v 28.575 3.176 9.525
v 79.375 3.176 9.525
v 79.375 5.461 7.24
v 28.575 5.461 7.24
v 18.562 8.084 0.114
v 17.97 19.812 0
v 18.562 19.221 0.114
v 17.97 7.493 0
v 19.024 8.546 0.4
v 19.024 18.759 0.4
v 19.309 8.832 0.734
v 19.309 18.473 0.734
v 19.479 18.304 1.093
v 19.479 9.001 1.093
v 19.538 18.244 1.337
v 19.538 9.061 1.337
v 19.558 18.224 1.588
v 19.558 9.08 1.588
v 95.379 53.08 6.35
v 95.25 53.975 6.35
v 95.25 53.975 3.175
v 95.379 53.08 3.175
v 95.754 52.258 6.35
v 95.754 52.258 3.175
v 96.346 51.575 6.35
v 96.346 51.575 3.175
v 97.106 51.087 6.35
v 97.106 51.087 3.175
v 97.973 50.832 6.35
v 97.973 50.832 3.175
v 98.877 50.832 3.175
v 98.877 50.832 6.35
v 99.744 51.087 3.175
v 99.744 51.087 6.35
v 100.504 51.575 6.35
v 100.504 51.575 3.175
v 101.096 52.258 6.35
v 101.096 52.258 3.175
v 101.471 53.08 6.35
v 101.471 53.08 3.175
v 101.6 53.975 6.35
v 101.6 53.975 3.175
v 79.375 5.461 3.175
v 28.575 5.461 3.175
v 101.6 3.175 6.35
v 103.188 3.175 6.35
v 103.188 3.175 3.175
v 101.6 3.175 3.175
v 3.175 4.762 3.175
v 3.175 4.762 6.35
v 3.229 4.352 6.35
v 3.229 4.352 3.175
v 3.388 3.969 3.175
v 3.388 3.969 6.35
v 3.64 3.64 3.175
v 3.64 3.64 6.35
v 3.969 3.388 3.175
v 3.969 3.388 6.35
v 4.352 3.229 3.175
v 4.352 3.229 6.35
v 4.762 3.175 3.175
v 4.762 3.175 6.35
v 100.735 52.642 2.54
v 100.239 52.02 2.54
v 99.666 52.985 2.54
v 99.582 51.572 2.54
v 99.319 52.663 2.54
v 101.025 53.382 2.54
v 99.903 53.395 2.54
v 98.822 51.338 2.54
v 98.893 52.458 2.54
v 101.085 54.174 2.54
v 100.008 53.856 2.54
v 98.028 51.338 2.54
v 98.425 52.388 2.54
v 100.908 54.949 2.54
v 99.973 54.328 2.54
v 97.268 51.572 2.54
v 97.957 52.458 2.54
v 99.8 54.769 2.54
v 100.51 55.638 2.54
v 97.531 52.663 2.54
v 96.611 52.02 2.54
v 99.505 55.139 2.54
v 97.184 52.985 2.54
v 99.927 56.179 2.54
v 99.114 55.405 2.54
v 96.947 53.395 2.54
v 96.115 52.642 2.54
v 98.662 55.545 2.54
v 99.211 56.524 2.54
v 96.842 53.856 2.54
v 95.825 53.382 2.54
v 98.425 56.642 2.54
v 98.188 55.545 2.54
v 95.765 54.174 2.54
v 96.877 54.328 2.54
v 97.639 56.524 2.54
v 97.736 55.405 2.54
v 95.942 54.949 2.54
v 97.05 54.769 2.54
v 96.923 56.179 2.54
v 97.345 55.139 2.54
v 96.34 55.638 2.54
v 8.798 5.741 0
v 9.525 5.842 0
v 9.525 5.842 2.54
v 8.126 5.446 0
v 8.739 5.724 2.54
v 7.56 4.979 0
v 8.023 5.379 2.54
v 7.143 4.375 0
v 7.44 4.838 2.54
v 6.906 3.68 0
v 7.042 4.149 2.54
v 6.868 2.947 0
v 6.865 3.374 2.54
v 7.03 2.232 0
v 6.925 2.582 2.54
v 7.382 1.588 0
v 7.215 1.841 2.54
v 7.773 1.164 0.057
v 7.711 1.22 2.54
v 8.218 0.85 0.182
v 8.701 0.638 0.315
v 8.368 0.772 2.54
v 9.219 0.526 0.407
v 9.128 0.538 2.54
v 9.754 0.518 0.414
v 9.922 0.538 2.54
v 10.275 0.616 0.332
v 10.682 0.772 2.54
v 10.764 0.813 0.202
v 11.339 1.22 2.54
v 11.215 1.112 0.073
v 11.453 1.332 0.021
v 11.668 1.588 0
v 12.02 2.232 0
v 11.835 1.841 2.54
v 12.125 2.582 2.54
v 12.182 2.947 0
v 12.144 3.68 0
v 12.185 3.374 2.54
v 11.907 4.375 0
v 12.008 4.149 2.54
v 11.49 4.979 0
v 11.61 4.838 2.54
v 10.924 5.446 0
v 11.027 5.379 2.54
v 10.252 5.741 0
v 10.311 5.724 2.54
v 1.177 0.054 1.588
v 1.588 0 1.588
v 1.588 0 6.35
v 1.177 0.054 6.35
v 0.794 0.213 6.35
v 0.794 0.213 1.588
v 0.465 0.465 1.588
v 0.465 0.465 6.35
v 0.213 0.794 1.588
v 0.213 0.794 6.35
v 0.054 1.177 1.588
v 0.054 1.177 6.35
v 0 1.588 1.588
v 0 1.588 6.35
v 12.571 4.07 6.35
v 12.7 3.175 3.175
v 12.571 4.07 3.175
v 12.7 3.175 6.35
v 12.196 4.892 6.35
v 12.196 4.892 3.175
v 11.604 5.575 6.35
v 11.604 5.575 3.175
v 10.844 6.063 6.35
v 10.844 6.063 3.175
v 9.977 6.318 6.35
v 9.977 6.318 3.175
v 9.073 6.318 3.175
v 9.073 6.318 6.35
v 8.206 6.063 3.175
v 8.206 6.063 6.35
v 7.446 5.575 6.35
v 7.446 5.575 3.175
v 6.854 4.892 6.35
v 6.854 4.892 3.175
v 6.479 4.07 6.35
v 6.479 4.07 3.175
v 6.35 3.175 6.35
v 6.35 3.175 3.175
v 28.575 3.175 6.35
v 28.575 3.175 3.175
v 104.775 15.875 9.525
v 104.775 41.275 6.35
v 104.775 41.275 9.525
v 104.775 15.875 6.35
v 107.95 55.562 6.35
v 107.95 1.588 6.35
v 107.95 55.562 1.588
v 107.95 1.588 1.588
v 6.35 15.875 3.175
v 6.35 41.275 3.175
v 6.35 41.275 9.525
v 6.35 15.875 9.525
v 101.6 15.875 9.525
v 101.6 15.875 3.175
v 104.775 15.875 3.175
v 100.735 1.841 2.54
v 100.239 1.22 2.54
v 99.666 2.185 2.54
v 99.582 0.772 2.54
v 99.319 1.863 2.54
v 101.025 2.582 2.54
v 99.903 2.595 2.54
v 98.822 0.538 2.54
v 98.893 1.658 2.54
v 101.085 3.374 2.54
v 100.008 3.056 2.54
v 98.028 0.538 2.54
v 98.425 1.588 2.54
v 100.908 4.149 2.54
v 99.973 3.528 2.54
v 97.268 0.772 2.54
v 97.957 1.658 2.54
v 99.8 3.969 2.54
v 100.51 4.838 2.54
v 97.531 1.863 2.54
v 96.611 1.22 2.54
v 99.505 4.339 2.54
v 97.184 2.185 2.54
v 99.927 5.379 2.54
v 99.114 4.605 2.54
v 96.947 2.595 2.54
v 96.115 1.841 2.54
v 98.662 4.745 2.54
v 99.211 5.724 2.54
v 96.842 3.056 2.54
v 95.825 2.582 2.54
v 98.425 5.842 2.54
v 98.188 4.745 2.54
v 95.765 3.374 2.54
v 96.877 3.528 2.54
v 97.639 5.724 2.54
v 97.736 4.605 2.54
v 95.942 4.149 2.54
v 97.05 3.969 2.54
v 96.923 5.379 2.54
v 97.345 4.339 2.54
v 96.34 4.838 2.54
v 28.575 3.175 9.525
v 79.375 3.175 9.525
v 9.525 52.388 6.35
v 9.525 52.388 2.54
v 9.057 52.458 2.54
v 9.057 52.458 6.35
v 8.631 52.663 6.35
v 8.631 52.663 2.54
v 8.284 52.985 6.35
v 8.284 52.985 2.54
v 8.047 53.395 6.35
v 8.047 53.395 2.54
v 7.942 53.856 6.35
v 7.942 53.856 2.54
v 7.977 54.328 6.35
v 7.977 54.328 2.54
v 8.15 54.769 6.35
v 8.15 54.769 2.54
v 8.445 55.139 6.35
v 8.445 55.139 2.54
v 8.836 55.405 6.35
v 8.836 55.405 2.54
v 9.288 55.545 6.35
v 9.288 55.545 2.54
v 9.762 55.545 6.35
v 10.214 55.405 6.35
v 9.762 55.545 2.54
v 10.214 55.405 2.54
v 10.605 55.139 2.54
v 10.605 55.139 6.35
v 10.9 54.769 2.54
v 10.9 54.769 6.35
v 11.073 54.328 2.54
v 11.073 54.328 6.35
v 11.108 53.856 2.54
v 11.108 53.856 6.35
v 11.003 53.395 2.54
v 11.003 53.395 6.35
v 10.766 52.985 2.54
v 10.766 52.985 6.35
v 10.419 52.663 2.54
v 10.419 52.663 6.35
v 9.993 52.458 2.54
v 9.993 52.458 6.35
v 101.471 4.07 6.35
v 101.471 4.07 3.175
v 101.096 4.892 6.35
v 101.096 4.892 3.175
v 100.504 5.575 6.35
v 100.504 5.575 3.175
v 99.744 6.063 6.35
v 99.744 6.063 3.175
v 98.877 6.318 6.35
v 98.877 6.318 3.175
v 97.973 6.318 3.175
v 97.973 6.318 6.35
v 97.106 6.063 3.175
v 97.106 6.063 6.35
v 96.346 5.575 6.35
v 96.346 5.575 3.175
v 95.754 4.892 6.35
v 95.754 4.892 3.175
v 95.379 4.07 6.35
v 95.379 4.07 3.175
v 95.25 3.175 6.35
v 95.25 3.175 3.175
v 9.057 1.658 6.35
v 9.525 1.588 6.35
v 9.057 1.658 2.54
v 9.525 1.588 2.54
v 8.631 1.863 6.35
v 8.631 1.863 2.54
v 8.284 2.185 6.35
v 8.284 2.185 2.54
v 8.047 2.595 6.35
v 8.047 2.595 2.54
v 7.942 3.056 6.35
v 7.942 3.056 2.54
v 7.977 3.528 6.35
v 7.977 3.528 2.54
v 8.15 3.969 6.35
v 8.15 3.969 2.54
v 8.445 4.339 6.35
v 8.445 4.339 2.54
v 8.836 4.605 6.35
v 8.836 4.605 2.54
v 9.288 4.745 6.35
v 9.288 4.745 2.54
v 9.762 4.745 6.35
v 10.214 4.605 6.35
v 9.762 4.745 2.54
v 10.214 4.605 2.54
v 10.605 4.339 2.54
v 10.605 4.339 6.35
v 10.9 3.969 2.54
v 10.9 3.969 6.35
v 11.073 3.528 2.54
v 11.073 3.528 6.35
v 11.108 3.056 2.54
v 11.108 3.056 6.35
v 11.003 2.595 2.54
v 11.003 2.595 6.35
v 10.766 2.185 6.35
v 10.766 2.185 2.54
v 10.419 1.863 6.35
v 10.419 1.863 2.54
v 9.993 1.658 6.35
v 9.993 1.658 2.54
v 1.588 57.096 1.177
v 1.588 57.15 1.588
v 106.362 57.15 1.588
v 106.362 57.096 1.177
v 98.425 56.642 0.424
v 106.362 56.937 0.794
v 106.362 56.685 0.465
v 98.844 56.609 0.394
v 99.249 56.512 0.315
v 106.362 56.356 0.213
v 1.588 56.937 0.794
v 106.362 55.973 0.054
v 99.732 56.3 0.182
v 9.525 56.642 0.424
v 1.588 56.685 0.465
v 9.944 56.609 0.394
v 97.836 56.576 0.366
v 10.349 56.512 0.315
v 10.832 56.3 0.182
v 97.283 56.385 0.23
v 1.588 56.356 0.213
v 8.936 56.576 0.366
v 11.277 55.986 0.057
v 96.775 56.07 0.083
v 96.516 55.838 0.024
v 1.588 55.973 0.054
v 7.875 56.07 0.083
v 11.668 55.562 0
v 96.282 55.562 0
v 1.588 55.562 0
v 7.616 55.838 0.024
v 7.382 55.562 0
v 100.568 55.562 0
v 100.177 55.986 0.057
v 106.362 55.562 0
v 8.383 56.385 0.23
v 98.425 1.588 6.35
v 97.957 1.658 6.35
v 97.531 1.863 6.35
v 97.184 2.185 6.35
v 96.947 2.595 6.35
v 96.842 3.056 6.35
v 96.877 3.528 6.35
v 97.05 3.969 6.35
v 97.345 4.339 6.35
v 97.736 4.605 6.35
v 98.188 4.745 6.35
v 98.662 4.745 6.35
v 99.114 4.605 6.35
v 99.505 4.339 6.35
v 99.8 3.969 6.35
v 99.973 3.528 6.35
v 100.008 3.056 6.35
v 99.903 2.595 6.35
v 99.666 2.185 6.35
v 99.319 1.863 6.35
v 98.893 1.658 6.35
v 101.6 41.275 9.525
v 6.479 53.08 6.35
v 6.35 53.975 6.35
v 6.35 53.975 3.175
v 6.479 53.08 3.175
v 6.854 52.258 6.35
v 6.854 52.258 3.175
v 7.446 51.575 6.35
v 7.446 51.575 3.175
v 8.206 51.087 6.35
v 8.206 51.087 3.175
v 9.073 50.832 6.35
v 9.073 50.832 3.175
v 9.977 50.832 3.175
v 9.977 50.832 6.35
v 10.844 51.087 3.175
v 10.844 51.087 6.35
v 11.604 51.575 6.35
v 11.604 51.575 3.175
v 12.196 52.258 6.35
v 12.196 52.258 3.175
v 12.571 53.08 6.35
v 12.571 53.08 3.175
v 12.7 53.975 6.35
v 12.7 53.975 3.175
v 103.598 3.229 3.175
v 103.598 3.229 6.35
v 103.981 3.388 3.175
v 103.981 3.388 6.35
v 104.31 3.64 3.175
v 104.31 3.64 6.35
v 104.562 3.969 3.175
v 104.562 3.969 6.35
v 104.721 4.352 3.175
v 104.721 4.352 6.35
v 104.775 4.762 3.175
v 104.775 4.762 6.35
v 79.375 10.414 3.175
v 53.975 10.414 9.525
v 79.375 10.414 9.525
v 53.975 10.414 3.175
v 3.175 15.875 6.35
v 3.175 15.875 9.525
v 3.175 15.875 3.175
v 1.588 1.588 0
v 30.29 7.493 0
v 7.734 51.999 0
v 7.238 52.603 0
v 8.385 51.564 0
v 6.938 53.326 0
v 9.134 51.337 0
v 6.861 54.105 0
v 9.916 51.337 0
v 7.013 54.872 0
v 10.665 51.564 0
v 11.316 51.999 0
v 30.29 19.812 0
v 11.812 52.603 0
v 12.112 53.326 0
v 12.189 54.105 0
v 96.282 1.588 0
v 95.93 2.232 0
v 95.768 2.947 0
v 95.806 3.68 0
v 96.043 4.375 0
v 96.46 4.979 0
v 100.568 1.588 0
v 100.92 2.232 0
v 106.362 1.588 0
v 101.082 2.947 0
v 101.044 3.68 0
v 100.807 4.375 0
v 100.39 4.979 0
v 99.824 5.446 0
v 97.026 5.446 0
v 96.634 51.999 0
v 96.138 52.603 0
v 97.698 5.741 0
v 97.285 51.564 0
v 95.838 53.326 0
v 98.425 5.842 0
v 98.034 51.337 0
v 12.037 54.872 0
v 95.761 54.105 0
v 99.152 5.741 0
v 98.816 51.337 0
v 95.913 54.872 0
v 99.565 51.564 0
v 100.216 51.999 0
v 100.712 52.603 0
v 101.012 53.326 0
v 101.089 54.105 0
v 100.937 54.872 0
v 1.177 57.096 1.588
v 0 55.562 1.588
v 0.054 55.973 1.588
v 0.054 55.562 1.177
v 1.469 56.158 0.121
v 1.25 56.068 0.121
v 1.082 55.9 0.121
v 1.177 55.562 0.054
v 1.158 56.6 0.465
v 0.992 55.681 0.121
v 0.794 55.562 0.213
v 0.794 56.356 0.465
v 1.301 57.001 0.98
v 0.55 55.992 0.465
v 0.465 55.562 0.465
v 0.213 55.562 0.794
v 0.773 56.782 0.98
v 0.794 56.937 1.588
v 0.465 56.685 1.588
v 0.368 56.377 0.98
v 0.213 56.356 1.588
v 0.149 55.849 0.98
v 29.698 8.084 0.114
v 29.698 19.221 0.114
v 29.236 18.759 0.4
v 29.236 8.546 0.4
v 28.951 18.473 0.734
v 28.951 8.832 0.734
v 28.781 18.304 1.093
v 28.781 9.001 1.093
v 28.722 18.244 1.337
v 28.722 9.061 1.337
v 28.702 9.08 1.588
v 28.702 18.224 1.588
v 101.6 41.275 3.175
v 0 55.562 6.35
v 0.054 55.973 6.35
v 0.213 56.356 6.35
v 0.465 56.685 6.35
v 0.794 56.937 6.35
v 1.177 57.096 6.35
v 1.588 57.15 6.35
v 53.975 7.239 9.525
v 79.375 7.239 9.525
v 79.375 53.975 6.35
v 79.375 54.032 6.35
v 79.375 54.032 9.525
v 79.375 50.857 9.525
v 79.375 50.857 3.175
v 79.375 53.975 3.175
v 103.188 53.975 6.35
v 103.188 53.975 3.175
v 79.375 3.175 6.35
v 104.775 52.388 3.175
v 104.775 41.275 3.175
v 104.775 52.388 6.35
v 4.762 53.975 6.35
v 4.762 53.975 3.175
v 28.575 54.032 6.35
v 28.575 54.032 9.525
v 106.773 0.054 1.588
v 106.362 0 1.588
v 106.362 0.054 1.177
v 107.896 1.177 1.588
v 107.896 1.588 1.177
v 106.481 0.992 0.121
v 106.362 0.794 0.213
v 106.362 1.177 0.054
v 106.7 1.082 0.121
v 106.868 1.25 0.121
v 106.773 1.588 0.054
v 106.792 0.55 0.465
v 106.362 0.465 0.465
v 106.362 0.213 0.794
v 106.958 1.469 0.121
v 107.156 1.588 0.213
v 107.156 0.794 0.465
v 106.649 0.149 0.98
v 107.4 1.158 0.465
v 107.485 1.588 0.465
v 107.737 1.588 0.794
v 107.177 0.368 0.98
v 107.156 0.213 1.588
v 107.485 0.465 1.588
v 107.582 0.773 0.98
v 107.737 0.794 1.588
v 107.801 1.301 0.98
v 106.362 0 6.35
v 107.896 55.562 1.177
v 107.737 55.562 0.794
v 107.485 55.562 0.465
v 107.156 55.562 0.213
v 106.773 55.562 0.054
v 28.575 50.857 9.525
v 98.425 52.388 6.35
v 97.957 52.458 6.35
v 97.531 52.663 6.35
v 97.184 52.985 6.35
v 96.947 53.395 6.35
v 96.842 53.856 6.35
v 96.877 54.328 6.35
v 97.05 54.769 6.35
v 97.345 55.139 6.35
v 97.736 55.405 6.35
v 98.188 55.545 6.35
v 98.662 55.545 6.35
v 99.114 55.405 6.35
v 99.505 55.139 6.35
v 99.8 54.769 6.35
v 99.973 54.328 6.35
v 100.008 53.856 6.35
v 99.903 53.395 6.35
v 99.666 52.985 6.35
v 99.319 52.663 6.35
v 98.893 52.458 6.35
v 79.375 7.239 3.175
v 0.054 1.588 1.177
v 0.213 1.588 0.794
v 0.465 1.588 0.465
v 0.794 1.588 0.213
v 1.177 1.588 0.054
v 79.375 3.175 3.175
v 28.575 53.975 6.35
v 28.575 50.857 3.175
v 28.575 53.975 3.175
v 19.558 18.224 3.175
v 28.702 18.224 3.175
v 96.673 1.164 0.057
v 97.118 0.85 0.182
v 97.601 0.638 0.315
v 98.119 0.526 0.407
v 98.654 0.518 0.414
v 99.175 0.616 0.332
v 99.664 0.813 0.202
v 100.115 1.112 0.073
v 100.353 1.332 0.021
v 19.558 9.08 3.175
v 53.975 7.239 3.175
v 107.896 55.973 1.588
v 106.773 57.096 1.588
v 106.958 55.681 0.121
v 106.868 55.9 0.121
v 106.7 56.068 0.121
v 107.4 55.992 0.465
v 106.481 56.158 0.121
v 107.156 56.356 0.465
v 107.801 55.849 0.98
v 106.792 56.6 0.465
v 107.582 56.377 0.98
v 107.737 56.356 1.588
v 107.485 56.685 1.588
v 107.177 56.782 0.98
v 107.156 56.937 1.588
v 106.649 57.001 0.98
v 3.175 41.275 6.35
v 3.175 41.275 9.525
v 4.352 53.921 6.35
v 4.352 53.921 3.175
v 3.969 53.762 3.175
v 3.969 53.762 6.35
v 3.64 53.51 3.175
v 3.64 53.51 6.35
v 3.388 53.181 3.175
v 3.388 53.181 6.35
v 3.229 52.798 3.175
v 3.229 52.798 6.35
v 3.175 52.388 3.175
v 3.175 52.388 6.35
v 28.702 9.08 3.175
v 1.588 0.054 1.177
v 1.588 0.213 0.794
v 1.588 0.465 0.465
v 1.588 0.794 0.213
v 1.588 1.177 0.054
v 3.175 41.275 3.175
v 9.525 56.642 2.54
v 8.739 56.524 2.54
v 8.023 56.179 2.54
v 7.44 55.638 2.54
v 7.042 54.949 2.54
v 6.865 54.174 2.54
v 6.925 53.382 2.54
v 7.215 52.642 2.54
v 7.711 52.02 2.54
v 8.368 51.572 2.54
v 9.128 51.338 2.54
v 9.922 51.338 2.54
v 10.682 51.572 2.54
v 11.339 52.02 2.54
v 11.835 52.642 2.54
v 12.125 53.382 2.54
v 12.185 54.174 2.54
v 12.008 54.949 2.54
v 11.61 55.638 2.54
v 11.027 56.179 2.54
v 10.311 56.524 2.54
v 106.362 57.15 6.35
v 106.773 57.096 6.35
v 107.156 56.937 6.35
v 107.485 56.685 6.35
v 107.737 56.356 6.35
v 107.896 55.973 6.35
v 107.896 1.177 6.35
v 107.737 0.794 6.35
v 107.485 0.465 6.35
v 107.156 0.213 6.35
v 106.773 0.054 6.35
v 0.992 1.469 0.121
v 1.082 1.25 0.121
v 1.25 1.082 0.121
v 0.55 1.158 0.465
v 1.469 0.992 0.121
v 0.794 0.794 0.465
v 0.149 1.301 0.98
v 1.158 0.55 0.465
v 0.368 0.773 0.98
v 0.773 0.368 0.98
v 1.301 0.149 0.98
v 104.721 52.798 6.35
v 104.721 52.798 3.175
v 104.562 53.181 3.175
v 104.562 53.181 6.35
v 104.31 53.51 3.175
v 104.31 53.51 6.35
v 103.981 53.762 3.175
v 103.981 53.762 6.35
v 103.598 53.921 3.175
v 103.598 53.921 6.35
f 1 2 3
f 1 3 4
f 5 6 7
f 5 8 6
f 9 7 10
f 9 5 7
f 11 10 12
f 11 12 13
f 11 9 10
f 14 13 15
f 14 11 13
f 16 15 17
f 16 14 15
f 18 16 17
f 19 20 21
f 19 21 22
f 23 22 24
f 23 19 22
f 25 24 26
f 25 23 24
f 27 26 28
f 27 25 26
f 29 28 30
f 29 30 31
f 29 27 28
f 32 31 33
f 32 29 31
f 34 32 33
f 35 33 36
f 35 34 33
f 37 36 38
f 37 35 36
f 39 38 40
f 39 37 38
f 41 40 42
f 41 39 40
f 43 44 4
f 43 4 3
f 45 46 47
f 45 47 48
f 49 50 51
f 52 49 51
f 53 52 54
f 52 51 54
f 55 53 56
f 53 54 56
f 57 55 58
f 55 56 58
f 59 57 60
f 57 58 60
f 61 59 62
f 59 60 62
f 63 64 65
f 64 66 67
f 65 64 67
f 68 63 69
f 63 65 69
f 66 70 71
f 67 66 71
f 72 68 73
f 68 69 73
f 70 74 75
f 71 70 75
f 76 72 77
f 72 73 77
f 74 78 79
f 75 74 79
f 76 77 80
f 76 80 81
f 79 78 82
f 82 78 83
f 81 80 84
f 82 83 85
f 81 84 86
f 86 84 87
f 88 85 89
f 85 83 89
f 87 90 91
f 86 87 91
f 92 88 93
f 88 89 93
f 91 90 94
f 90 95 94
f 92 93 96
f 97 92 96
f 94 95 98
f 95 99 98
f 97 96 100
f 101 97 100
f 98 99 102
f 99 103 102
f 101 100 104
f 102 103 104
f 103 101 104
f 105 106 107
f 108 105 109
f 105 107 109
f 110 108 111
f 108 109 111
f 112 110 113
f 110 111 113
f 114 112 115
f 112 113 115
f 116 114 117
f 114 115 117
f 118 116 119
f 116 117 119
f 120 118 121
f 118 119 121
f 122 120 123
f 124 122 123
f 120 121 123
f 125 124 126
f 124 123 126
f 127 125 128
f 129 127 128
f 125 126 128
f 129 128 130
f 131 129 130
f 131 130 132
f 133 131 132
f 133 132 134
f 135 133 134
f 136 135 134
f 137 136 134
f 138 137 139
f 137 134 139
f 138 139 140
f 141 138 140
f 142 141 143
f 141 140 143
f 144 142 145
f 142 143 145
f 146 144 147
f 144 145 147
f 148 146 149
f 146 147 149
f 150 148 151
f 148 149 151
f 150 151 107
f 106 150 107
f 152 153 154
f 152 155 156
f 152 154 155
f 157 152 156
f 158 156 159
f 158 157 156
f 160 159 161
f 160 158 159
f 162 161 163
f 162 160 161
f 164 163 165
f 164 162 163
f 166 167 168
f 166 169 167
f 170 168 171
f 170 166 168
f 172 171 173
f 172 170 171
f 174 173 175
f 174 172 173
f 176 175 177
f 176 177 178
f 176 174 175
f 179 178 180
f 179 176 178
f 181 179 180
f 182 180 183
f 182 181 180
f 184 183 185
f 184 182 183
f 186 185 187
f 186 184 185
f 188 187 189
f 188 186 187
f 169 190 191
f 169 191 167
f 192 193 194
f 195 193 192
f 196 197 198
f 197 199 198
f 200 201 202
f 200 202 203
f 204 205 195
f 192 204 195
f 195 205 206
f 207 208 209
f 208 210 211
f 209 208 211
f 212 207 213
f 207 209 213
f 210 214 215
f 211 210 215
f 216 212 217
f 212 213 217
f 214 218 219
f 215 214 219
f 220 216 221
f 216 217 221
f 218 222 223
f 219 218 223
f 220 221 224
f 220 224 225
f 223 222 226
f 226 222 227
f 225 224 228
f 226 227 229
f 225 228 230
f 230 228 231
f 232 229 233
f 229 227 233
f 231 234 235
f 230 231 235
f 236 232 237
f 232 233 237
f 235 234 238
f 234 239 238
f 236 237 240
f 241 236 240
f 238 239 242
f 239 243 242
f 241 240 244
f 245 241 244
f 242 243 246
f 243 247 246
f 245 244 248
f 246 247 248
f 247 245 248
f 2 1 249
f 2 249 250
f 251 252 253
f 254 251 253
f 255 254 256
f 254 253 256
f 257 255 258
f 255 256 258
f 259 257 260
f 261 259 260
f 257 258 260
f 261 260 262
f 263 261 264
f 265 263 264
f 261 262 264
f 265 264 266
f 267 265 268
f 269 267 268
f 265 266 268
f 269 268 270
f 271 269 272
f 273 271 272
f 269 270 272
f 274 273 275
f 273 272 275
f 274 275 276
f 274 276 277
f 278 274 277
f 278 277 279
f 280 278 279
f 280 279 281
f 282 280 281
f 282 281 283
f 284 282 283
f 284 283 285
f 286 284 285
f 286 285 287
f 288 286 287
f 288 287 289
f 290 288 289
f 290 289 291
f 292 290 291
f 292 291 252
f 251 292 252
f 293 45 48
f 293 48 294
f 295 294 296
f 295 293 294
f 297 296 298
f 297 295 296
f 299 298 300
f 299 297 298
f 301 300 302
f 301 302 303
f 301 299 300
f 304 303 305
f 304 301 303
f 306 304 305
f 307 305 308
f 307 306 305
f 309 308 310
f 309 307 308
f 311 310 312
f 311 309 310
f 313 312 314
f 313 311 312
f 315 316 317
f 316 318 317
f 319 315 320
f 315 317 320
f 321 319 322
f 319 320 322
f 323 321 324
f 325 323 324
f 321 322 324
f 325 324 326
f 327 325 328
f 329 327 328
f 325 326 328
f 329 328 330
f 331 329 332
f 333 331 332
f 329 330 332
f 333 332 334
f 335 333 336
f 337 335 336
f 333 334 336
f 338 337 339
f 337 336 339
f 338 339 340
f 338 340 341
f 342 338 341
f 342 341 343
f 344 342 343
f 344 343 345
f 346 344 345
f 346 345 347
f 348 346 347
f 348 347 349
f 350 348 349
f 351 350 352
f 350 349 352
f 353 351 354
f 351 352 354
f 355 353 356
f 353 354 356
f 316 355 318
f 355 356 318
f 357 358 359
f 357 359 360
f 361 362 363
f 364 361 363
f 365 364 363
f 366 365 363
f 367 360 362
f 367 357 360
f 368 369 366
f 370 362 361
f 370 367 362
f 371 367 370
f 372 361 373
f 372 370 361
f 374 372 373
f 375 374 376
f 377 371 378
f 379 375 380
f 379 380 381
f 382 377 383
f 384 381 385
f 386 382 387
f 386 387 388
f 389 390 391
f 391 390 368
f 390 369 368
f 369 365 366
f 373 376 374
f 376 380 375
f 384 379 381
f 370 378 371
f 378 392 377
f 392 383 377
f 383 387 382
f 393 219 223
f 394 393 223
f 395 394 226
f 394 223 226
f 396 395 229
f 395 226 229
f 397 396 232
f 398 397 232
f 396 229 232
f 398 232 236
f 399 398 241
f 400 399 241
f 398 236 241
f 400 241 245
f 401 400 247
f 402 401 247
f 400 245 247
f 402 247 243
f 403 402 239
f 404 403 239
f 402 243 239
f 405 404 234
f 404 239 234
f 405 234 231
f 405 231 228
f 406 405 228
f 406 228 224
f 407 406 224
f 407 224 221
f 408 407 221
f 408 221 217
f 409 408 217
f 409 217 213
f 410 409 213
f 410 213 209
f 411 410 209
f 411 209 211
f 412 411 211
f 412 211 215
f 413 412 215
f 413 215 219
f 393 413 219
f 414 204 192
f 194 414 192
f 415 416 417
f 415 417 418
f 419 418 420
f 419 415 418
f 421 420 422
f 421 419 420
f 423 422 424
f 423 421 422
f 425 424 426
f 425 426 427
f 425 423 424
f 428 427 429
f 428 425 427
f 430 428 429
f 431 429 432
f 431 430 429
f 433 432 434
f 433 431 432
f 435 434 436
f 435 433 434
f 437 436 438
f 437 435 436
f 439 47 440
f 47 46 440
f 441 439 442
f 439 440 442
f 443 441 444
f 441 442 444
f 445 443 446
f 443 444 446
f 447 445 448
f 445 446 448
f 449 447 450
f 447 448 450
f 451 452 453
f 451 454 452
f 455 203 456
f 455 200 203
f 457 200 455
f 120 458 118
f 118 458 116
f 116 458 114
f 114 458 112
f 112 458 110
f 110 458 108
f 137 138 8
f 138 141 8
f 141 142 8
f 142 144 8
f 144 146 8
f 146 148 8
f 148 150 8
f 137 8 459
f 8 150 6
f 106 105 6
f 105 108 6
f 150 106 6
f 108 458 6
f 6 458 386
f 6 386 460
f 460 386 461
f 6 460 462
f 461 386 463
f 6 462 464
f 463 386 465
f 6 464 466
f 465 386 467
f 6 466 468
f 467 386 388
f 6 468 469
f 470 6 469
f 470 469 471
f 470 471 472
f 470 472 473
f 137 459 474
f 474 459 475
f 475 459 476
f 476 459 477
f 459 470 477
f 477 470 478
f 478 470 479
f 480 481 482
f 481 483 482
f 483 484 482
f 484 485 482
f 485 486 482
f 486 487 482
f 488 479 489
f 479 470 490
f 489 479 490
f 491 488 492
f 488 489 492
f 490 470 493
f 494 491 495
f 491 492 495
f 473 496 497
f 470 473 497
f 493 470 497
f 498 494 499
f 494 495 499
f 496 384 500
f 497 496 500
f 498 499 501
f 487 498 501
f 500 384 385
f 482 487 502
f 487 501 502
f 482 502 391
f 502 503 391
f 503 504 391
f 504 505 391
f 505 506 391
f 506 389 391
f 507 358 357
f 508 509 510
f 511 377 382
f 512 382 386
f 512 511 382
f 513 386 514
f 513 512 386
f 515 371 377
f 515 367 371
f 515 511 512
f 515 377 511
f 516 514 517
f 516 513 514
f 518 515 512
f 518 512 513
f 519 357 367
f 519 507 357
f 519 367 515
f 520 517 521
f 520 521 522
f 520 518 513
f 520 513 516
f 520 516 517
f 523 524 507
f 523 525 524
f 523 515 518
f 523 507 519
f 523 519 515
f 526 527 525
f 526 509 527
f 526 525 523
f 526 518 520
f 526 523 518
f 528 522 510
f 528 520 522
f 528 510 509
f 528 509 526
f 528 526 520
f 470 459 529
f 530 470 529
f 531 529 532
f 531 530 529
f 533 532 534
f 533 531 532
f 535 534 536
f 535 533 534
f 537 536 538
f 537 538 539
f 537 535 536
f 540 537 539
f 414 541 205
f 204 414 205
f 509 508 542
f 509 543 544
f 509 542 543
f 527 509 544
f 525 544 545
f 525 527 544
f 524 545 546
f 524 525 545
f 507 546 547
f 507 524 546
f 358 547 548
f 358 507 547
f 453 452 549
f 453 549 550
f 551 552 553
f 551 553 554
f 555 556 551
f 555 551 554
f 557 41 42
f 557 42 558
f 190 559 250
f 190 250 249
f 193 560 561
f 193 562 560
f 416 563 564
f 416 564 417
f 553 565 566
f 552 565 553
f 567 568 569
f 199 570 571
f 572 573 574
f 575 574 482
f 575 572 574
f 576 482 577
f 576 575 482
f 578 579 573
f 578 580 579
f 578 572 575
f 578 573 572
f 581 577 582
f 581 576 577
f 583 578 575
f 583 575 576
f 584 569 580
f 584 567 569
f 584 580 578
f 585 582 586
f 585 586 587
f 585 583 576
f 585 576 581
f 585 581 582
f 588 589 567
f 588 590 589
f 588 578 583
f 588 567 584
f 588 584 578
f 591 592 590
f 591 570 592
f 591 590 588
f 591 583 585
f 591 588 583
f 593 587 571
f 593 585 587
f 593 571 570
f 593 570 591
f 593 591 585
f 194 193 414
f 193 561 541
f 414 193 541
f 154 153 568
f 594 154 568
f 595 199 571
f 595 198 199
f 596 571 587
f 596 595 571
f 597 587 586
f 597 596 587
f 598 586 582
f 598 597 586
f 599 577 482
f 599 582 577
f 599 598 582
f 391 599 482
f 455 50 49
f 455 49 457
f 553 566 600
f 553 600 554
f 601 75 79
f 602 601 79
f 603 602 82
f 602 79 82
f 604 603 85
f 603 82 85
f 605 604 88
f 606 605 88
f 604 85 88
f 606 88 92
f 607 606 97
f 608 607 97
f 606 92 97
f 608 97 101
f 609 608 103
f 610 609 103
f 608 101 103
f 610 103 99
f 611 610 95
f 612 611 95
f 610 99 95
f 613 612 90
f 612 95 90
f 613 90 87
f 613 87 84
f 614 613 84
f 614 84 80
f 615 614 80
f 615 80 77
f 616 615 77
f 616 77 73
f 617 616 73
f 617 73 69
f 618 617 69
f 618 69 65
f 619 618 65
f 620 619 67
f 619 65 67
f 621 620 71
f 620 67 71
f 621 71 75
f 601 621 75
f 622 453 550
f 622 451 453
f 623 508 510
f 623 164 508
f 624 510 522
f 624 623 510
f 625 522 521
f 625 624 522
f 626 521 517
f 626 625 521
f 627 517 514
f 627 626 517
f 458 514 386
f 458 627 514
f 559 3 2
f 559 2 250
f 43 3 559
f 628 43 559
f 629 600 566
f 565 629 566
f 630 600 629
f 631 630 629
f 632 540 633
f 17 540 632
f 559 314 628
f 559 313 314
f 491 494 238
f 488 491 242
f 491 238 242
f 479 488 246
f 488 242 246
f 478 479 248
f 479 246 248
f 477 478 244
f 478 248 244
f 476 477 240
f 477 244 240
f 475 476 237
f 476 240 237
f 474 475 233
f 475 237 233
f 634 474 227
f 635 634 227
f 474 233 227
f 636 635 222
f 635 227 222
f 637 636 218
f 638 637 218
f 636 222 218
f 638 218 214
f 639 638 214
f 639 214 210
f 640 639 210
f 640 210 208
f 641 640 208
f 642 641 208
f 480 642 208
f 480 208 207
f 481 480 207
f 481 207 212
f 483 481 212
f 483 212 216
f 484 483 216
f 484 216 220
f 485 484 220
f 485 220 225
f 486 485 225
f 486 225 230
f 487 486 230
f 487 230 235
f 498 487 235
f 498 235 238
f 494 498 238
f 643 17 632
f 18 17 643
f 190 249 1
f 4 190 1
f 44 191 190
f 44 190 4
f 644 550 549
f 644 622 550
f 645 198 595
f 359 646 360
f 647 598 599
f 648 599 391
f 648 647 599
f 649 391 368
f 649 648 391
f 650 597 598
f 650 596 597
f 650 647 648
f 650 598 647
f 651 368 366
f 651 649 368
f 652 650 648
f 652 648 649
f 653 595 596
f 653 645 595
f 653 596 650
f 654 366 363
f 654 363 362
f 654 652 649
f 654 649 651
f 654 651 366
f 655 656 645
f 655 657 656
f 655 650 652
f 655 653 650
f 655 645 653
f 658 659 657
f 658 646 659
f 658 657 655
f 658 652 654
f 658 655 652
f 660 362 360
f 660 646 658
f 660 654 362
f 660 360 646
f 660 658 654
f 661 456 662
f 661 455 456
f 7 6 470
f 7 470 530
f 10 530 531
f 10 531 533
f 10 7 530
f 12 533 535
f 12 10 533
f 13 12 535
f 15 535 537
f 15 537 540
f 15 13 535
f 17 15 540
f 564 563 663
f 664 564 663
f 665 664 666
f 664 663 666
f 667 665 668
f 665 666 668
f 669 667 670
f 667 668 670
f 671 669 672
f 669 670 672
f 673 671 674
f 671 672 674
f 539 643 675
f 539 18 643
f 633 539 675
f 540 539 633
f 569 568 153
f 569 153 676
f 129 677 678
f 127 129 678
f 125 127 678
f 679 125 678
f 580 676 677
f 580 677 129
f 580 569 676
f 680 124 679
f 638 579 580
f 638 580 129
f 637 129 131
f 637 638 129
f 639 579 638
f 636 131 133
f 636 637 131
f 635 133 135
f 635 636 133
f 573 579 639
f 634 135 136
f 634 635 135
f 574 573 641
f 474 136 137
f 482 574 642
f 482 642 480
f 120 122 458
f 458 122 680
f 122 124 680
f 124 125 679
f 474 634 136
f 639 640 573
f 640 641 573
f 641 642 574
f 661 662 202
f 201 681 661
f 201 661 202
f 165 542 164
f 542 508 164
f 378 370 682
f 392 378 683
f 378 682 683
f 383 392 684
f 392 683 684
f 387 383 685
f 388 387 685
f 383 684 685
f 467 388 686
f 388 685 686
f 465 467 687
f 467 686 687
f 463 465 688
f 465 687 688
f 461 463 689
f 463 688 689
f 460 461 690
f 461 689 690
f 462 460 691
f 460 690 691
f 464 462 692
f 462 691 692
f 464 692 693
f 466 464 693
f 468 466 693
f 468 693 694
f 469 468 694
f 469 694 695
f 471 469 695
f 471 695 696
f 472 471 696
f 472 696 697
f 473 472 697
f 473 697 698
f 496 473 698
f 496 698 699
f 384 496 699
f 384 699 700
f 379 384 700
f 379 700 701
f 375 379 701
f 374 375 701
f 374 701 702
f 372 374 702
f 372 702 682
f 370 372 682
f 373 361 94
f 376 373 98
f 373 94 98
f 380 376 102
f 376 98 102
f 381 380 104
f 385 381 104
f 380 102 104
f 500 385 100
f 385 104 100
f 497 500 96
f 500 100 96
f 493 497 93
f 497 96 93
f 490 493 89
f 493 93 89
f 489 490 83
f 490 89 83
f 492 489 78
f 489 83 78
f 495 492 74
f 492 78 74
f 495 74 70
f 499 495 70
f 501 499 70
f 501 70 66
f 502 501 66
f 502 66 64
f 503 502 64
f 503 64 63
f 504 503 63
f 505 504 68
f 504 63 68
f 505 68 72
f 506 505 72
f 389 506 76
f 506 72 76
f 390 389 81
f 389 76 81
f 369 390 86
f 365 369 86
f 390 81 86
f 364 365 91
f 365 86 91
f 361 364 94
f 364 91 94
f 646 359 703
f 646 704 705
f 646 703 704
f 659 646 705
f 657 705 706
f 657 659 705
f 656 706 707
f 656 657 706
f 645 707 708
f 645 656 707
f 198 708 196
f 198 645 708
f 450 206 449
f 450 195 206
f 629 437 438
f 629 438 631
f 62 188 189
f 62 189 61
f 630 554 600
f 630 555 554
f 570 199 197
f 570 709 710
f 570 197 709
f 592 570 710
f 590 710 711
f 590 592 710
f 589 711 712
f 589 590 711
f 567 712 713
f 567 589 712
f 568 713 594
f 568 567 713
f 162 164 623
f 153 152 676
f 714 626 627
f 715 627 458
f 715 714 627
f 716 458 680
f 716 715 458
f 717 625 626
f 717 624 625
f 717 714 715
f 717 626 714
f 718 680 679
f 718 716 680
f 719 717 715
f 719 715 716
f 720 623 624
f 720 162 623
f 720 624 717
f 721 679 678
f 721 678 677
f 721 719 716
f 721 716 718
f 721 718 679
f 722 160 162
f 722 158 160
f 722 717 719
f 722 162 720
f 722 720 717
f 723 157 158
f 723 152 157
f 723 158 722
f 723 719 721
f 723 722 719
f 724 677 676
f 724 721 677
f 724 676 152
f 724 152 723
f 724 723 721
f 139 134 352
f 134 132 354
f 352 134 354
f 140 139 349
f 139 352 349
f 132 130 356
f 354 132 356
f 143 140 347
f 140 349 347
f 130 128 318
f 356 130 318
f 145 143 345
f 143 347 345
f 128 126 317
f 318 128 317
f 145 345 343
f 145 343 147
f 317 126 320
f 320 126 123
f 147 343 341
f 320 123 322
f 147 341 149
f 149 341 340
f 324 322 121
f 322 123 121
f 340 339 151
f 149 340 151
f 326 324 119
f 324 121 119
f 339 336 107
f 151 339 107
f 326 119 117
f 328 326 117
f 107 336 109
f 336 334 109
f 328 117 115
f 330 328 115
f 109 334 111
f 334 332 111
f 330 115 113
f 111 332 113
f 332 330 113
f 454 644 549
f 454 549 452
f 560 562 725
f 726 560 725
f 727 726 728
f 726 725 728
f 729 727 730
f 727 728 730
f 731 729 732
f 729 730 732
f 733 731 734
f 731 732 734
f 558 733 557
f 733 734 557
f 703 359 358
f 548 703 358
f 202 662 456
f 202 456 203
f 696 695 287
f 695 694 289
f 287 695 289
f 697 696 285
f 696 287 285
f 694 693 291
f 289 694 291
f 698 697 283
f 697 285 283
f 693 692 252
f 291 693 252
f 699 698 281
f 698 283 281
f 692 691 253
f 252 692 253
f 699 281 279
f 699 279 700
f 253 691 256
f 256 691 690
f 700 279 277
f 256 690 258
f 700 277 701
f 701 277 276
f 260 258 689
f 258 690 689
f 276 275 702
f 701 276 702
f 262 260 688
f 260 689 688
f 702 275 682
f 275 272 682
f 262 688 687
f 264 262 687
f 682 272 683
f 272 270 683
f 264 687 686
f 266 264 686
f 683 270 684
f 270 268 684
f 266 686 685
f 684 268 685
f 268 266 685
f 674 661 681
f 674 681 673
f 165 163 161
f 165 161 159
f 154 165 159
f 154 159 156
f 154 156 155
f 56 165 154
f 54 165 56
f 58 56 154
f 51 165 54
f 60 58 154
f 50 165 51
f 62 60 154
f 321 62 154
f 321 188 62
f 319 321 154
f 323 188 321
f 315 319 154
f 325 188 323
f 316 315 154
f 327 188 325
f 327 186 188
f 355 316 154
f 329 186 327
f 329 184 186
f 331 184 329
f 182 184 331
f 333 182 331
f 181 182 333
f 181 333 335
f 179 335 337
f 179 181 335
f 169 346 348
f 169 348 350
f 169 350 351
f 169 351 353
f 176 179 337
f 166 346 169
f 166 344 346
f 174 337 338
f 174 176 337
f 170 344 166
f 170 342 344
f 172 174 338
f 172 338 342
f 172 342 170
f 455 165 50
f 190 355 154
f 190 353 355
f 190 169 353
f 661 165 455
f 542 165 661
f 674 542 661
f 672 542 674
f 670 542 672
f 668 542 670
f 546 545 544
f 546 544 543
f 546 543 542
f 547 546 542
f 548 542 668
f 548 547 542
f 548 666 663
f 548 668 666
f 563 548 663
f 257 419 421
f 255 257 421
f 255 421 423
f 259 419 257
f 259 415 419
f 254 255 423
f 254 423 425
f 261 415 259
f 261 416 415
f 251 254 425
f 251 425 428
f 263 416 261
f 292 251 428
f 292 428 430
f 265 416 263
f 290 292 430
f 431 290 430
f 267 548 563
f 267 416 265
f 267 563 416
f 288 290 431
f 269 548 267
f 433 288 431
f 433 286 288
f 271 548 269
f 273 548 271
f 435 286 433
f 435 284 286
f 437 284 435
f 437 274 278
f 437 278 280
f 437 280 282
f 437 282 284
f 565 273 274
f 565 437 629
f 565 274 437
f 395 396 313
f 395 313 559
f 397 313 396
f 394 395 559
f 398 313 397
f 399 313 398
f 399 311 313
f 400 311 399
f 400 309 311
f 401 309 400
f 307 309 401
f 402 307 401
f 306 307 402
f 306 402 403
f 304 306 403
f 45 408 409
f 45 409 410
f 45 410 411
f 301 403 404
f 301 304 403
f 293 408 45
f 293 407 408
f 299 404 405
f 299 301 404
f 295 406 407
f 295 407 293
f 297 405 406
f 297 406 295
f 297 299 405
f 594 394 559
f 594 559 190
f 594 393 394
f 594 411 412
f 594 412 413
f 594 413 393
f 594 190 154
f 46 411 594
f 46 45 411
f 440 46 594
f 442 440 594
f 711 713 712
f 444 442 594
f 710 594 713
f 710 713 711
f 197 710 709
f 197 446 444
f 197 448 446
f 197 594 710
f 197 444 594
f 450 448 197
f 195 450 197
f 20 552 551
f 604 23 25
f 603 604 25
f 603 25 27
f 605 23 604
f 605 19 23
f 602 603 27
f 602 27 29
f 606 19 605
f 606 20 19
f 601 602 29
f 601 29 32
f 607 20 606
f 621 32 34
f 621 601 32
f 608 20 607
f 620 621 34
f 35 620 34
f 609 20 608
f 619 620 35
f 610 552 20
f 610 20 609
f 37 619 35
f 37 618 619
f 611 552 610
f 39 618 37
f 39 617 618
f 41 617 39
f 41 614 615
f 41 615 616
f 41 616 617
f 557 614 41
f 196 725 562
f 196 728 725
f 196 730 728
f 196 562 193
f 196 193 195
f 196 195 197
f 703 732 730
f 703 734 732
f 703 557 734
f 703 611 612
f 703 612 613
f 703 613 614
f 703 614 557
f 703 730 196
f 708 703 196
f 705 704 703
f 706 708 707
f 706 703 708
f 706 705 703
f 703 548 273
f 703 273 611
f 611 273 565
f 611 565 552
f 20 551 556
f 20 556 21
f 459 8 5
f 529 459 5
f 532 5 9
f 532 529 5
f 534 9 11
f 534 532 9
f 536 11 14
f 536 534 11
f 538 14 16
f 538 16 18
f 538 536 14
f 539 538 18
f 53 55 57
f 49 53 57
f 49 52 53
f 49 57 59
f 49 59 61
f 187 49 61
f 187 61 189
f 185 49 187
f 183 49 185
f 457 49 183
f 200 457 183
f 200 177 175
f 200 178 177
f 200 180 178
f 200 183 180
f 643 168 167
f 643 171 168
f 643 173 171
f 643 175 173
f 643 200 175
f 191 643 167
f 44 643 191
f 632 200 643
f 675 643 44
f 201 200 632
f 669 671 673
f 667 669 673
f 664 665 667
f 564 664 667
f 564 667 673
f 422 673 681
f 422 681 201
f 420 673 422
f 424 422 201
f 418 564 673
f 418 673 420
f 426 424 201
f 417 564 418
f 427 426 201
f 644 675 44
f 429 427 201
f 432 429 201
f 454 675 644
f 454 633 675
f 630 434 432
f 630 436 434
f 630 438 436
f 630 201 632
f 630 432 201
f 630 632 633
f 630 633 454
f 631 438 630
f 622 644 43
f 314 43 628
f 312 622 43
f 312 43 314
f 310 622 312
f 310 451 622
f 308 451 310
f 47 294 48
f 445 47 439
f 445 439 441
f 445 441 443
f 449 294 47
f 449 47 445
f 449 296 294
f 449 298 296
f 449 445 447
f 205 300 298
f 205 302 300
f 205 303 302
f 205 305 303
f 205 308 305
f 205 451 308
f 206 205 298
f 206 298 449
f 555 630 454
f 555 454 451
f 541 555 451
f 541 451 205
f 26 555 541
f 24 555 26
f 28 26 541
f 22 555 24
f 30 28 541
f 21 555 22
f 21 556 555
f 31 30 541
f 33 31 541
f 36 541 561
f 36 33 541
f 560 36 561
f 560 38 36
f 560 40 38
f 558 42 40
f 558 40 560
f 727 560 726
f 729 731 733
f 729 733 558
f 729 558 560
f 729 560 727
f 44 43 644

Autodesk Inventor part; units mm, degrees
ref_plane "YZ Plane" through (0, 0, 0) normal (1, 0, 0) x (0, 1, 0)
ref_plane "XZ Plane" through (0, 0, 0) normal (0, 1, 0) x (-1, 0, 0)
ref_plane "XY Plane" through (0, 0, 0) normal (0, 0, 1) x (1, 0, 0)
sketch "Sketch1" plane through (0, 0, 0) normal (0, 0, 1) x (1, 0, 0)
  line L0 (1.5875, 0) -> (106.3625, 0)
  line L1 (107.95, 1.5875) -> (107.95, 55.5625)
  line L2 (106.3625, 57.15) -> (1.5875, 57.15)
  line L3 (0, 55.5625) -> (0, 1.5875)
  arc A0 (1.5875, 57.15) -> (0, 55.5625) centre (1.5875, 55.5625) ccw
  arc A1 (107.95, 55.5625) -> (106.3625, 57.15) centre (106.3625, 55.5625) ccw
  arc A2 (106.3625, 0) -> (107.95, 1.5875) centre (106.3625, 1.5875) ccw
  arc A3 (0, 1.5875) -> (1.5875, 0) centre (1.5875, 1.5875) ccw
  point P0 (0, 0)
  point P1 (107.95, 0)
  point P2 (0, 57.15)
  dimension "d0" = 57.15
  dimension "d1" = 107.95
  dimension "d2" = 1.5875
  dimension "d3" = 1.5875
extrude "Extrusion1" add sketch "Sketch1" along normal blind 6.35
sketch "Sketch2" plane through (0, 0, 6.35) normal (0, 0, 1) x (1, 0, 0)
  line L0 (104.775, 52.3875) -> (104.775, 4.7625)
  line L1 (3.175, 4.7625) -> (3.175, 52.3875)
  arc A0 (4.7625, 53.975) -> (3.175, 52.3875) centre (4.7625, 52.3875) ccw
  arc A1 (104.775, 52.3875) -> (103.1875, 53.975) centre (103.1875, 52.3875) ccw
  arc A2 (103.1875, 3.175) -> (104.775, 4.7625) centre (103.1875, 4.7625) ccw
  arc A3 (3.175, 4.7625) -> (4.7625, 3.175) centre (4.7625, 4.7625) ccw
  line L2 (106.3625, 57.15) -> (1.5875, 57.15) projected
  line L3 (107.95, 1.5875) -> (107.95, 55.5625) projected
  line L4 (1.5875, 0) -> (106.3625, 0) projected
  line L5 (0, 55.5625) -> (0, 1.5875) projected
  arc A4 (6.35, 53.975) -> (12.7, 53.975) centre (9.525, 53.975) ccw
  arc A5 (95.25, 53.975) -> (101.6, 53.975) centre (98.425, 53.975) ccw
  arc A6 (101.6, 3.175) -> (95.25, 3.175) centre (98.425, 3.175) ccw
  arc A7 (12.7, 3.175) -> (6.35, 3.175) centre (9.525, 3.175) ccw
  line L6 (4.7625, 53.975) -> (6.35, 53.975)
  line L7 (12.7, 53.975) -> (95.25, 53.975)
  line L8 (101.6, 53.975) -> (103.1875, 53.975)
  line L9 (103.1875, 3.175) -> (101.6, 3.175)
  line L10 (95.25, 3.175) -> (12.7, 3.175)
  line L11 (6.35, 3.175) -> (4.7625, 3.175)
  point P0 (0, 0)
  dimension "d6" = 1.5875
  dimension "d8" = 3.175
  dimension "d10" = 3.175
  dimension "d11" = 6.35
  dimension "d12" = 6.35
  dimension "d43" = 3.175
extrude "Extrusion2" cut sketch "Sketch2" against normal blind 3.175
fillet "Fillet1" radius 1.5875 8 edges at (0.465, 56.685, 0) (0, 28.575, 0) (0.465, 0.465, 0) (53.975, 0, 0) (107.485, 0.465, 0) (107.95, 28.575, 0) (107.485, 56.685, 0) (53.975, 57.15, 0)
sketch "Sketch3" plane through (0, 0, 3.175) normal (0, 0, 1) x (1, 0, 0)
  line L0 (28.575, 54.0321) -> (79.375, 54.0321)
  line L1 (79.375, 54.0321) -> (79.375, 50.8571)
  line L2 (79.375, 50.8571) -> (28.575, 50.8571)
  line L3 (28.575, 50.8571) -> (28.575, 54.0321)
  line L4 (3.175, 4.7625) -> (3.175, 52.3875) projected
  line L5 (3.175, 41.275) -> (6.35, 41.275)
  line L6 (6.35, 41.275) -> (6.35, 15.875)
  line L7 (6.35, 15.875) -> (3.175, 15.875)
  line L8 (3.175, 15.875) -> (3.175, 41.275)
  line L9 (104.775, 52.3875) -> (104.775, 4.7625) projected
  line L10 (104.775, 41.275) -> (101.6, 41.275)
  line L11 (101.6, 41.275) -> (101.6, 15.875)
  line L12 (101.6, 15.875) -> (104.775, 15.875)
  line L13 (104.775, 15.875) -> (104.775, 41.275)
  line L14 (95.25, 3.175) -> (12.7, 3.175) projected
  line L15 (79.375, 3.175) -> (28.575, 3.175)
  line L16 (28.575, 3.175) -> (28.575, 5.461)
  line L17 (28.575, 5.461) -> (79.375, 5.461)
  line L18 (79.375, 5.461) -> (79.375, 3.175)
  line L19 (103.1875, 3.175) -> (101.6, 3.175) projected
  line L20 (101.6, 53.975) -> (103.1875, 53.975) projected
  point P0 (0, 0)
  point P1 (28.575, 4.318)
  point P2 (79.375, 4.318)
  point P3 (79.375, 52.4446)
  point P4 (4.7625, 41.275)
  point P5 (103.1875, 41.275)
  point P6 (103.1875, 15.875)
  point P7 (4.7625, 15.875)
  point P8 (102.3937, 3.175)
  dimension "d16" = 25.4
  dimension "d17" = 25.4
  dimension "d18" = 2.286
  dimension "d19" = 3.175
  dimension "d20" = 3.175
  dimension "d21" = 3.175
  dimension "d22" = 12.7
  dimension "d23" = 12.7
extrude "Extrusion3" add sketch "Sketch3" along normal blind 6.35
hole "Hole1" at (9.525, 53.975, 6.35) at (98.425, 53.975, 6.35) at (98.425, 3.175, 6.35) at (9.525, 3.175, 6.35) direction (0, 0, -1) diameter 3.175 end through all
sketch "Sketch5" plane through (0, 0, 0) normal (0, 0, -1) x (-1, 0, 0)
  line L0 (-28.702, 18.2245) -> (-19.558, 18.2245)
  line L1 (-19.558, 18.2245) -> (-19.558, 9.0805)
  line L2 (-19.558, 9.0805) -> (-28.702, 9.0805)
  line L3 (-28.702, 9.0805) -> (-28.702, 18.2245)
  line L4 (-1.5875, 1.5875) -> (-106.3625, 1.5875) projected
  line L5 (-1.5875, 55.5625) -> (-1.5875, 1.5875) projected
  point P0 (0, 0)
  point P1 (-24.13, 9.0805)
  dimension "d36" = 7.493
  dimension "d37" = 17.9705
  dimension "d38" = 9.144
  dimension "d39" = 9.144
extrude "Extrusion4" cut sketch "Sketch5" against normal blind 6.35
fillet "Fillet2" radius 1.5875 4 edges at (24.13, 18.2245, 0) (19.558, 13.6525, 0) (28.702, 13.6525, 0) (24.13, 9.0805, 0)
sketch "Sketch7" plane through (0, 0, 3.175) normal (0, 0, 1) x (1, 0, 0)
  line L0 (79.375, 7.239) -> (53.975, 7.239)
  line L1 (53.975, 7.239) -> (53.975, 10.414)
  line L2 (53.975, 10.414) -> (79.375, 10.414)
  line L3 (79.375, 10.414) -> (79.375, 7.239)
  line L4 (79.375, 3.175) -> (79.375, 6.35) projected
  line L5 (28.575, 5.461) -> (79.375, 5.461) projected
  point P0 (0, 0)
  point P1 (79.375, 5.461)
  dimension "d48" = 3.175
  dimension "d49" = 25.4
  dimension "d50" = 0
  dimension "d51" = 1.778
extrude "Extrusion6" add sketch "Sketch7" along normal blind 6.35
chamfer "Chamfer2" distance 2.286 angle 45 1 edges at (53.975, 5.461, 9.525)
sketch "Sketch8" plane through (0, 0, 0) normal (0, 0, -1) x (-1, 0, 0)
  circle A0 centre (-98.425, 53.975) radius 1.5875 projected
  circle A1 centre (-9.525, 53.975) radius 1.5875 projected
  circle A2 centre (-9.525, 3.175) radius 1.5875 projected
  arc A3 (-95.25, 3.175) -> (-101.6, 3.175) centre (-98.425, 3.175) ccw projected
  point P0 (0, 0)
  point P1 (-9.525, 1.5875)
hole "Hole2" at (98.425, 53.975, 0) at (9.525, 53.975, 0) at (9.525, 3.175, 0) at (98.425, 3.175, 0) direction (0, 0, 1) diameter 3.175 depth 6.35 tip angle 118 counterbore diameter 5.334 counterbore depth 2.54
properties part number "Case_Rear"
